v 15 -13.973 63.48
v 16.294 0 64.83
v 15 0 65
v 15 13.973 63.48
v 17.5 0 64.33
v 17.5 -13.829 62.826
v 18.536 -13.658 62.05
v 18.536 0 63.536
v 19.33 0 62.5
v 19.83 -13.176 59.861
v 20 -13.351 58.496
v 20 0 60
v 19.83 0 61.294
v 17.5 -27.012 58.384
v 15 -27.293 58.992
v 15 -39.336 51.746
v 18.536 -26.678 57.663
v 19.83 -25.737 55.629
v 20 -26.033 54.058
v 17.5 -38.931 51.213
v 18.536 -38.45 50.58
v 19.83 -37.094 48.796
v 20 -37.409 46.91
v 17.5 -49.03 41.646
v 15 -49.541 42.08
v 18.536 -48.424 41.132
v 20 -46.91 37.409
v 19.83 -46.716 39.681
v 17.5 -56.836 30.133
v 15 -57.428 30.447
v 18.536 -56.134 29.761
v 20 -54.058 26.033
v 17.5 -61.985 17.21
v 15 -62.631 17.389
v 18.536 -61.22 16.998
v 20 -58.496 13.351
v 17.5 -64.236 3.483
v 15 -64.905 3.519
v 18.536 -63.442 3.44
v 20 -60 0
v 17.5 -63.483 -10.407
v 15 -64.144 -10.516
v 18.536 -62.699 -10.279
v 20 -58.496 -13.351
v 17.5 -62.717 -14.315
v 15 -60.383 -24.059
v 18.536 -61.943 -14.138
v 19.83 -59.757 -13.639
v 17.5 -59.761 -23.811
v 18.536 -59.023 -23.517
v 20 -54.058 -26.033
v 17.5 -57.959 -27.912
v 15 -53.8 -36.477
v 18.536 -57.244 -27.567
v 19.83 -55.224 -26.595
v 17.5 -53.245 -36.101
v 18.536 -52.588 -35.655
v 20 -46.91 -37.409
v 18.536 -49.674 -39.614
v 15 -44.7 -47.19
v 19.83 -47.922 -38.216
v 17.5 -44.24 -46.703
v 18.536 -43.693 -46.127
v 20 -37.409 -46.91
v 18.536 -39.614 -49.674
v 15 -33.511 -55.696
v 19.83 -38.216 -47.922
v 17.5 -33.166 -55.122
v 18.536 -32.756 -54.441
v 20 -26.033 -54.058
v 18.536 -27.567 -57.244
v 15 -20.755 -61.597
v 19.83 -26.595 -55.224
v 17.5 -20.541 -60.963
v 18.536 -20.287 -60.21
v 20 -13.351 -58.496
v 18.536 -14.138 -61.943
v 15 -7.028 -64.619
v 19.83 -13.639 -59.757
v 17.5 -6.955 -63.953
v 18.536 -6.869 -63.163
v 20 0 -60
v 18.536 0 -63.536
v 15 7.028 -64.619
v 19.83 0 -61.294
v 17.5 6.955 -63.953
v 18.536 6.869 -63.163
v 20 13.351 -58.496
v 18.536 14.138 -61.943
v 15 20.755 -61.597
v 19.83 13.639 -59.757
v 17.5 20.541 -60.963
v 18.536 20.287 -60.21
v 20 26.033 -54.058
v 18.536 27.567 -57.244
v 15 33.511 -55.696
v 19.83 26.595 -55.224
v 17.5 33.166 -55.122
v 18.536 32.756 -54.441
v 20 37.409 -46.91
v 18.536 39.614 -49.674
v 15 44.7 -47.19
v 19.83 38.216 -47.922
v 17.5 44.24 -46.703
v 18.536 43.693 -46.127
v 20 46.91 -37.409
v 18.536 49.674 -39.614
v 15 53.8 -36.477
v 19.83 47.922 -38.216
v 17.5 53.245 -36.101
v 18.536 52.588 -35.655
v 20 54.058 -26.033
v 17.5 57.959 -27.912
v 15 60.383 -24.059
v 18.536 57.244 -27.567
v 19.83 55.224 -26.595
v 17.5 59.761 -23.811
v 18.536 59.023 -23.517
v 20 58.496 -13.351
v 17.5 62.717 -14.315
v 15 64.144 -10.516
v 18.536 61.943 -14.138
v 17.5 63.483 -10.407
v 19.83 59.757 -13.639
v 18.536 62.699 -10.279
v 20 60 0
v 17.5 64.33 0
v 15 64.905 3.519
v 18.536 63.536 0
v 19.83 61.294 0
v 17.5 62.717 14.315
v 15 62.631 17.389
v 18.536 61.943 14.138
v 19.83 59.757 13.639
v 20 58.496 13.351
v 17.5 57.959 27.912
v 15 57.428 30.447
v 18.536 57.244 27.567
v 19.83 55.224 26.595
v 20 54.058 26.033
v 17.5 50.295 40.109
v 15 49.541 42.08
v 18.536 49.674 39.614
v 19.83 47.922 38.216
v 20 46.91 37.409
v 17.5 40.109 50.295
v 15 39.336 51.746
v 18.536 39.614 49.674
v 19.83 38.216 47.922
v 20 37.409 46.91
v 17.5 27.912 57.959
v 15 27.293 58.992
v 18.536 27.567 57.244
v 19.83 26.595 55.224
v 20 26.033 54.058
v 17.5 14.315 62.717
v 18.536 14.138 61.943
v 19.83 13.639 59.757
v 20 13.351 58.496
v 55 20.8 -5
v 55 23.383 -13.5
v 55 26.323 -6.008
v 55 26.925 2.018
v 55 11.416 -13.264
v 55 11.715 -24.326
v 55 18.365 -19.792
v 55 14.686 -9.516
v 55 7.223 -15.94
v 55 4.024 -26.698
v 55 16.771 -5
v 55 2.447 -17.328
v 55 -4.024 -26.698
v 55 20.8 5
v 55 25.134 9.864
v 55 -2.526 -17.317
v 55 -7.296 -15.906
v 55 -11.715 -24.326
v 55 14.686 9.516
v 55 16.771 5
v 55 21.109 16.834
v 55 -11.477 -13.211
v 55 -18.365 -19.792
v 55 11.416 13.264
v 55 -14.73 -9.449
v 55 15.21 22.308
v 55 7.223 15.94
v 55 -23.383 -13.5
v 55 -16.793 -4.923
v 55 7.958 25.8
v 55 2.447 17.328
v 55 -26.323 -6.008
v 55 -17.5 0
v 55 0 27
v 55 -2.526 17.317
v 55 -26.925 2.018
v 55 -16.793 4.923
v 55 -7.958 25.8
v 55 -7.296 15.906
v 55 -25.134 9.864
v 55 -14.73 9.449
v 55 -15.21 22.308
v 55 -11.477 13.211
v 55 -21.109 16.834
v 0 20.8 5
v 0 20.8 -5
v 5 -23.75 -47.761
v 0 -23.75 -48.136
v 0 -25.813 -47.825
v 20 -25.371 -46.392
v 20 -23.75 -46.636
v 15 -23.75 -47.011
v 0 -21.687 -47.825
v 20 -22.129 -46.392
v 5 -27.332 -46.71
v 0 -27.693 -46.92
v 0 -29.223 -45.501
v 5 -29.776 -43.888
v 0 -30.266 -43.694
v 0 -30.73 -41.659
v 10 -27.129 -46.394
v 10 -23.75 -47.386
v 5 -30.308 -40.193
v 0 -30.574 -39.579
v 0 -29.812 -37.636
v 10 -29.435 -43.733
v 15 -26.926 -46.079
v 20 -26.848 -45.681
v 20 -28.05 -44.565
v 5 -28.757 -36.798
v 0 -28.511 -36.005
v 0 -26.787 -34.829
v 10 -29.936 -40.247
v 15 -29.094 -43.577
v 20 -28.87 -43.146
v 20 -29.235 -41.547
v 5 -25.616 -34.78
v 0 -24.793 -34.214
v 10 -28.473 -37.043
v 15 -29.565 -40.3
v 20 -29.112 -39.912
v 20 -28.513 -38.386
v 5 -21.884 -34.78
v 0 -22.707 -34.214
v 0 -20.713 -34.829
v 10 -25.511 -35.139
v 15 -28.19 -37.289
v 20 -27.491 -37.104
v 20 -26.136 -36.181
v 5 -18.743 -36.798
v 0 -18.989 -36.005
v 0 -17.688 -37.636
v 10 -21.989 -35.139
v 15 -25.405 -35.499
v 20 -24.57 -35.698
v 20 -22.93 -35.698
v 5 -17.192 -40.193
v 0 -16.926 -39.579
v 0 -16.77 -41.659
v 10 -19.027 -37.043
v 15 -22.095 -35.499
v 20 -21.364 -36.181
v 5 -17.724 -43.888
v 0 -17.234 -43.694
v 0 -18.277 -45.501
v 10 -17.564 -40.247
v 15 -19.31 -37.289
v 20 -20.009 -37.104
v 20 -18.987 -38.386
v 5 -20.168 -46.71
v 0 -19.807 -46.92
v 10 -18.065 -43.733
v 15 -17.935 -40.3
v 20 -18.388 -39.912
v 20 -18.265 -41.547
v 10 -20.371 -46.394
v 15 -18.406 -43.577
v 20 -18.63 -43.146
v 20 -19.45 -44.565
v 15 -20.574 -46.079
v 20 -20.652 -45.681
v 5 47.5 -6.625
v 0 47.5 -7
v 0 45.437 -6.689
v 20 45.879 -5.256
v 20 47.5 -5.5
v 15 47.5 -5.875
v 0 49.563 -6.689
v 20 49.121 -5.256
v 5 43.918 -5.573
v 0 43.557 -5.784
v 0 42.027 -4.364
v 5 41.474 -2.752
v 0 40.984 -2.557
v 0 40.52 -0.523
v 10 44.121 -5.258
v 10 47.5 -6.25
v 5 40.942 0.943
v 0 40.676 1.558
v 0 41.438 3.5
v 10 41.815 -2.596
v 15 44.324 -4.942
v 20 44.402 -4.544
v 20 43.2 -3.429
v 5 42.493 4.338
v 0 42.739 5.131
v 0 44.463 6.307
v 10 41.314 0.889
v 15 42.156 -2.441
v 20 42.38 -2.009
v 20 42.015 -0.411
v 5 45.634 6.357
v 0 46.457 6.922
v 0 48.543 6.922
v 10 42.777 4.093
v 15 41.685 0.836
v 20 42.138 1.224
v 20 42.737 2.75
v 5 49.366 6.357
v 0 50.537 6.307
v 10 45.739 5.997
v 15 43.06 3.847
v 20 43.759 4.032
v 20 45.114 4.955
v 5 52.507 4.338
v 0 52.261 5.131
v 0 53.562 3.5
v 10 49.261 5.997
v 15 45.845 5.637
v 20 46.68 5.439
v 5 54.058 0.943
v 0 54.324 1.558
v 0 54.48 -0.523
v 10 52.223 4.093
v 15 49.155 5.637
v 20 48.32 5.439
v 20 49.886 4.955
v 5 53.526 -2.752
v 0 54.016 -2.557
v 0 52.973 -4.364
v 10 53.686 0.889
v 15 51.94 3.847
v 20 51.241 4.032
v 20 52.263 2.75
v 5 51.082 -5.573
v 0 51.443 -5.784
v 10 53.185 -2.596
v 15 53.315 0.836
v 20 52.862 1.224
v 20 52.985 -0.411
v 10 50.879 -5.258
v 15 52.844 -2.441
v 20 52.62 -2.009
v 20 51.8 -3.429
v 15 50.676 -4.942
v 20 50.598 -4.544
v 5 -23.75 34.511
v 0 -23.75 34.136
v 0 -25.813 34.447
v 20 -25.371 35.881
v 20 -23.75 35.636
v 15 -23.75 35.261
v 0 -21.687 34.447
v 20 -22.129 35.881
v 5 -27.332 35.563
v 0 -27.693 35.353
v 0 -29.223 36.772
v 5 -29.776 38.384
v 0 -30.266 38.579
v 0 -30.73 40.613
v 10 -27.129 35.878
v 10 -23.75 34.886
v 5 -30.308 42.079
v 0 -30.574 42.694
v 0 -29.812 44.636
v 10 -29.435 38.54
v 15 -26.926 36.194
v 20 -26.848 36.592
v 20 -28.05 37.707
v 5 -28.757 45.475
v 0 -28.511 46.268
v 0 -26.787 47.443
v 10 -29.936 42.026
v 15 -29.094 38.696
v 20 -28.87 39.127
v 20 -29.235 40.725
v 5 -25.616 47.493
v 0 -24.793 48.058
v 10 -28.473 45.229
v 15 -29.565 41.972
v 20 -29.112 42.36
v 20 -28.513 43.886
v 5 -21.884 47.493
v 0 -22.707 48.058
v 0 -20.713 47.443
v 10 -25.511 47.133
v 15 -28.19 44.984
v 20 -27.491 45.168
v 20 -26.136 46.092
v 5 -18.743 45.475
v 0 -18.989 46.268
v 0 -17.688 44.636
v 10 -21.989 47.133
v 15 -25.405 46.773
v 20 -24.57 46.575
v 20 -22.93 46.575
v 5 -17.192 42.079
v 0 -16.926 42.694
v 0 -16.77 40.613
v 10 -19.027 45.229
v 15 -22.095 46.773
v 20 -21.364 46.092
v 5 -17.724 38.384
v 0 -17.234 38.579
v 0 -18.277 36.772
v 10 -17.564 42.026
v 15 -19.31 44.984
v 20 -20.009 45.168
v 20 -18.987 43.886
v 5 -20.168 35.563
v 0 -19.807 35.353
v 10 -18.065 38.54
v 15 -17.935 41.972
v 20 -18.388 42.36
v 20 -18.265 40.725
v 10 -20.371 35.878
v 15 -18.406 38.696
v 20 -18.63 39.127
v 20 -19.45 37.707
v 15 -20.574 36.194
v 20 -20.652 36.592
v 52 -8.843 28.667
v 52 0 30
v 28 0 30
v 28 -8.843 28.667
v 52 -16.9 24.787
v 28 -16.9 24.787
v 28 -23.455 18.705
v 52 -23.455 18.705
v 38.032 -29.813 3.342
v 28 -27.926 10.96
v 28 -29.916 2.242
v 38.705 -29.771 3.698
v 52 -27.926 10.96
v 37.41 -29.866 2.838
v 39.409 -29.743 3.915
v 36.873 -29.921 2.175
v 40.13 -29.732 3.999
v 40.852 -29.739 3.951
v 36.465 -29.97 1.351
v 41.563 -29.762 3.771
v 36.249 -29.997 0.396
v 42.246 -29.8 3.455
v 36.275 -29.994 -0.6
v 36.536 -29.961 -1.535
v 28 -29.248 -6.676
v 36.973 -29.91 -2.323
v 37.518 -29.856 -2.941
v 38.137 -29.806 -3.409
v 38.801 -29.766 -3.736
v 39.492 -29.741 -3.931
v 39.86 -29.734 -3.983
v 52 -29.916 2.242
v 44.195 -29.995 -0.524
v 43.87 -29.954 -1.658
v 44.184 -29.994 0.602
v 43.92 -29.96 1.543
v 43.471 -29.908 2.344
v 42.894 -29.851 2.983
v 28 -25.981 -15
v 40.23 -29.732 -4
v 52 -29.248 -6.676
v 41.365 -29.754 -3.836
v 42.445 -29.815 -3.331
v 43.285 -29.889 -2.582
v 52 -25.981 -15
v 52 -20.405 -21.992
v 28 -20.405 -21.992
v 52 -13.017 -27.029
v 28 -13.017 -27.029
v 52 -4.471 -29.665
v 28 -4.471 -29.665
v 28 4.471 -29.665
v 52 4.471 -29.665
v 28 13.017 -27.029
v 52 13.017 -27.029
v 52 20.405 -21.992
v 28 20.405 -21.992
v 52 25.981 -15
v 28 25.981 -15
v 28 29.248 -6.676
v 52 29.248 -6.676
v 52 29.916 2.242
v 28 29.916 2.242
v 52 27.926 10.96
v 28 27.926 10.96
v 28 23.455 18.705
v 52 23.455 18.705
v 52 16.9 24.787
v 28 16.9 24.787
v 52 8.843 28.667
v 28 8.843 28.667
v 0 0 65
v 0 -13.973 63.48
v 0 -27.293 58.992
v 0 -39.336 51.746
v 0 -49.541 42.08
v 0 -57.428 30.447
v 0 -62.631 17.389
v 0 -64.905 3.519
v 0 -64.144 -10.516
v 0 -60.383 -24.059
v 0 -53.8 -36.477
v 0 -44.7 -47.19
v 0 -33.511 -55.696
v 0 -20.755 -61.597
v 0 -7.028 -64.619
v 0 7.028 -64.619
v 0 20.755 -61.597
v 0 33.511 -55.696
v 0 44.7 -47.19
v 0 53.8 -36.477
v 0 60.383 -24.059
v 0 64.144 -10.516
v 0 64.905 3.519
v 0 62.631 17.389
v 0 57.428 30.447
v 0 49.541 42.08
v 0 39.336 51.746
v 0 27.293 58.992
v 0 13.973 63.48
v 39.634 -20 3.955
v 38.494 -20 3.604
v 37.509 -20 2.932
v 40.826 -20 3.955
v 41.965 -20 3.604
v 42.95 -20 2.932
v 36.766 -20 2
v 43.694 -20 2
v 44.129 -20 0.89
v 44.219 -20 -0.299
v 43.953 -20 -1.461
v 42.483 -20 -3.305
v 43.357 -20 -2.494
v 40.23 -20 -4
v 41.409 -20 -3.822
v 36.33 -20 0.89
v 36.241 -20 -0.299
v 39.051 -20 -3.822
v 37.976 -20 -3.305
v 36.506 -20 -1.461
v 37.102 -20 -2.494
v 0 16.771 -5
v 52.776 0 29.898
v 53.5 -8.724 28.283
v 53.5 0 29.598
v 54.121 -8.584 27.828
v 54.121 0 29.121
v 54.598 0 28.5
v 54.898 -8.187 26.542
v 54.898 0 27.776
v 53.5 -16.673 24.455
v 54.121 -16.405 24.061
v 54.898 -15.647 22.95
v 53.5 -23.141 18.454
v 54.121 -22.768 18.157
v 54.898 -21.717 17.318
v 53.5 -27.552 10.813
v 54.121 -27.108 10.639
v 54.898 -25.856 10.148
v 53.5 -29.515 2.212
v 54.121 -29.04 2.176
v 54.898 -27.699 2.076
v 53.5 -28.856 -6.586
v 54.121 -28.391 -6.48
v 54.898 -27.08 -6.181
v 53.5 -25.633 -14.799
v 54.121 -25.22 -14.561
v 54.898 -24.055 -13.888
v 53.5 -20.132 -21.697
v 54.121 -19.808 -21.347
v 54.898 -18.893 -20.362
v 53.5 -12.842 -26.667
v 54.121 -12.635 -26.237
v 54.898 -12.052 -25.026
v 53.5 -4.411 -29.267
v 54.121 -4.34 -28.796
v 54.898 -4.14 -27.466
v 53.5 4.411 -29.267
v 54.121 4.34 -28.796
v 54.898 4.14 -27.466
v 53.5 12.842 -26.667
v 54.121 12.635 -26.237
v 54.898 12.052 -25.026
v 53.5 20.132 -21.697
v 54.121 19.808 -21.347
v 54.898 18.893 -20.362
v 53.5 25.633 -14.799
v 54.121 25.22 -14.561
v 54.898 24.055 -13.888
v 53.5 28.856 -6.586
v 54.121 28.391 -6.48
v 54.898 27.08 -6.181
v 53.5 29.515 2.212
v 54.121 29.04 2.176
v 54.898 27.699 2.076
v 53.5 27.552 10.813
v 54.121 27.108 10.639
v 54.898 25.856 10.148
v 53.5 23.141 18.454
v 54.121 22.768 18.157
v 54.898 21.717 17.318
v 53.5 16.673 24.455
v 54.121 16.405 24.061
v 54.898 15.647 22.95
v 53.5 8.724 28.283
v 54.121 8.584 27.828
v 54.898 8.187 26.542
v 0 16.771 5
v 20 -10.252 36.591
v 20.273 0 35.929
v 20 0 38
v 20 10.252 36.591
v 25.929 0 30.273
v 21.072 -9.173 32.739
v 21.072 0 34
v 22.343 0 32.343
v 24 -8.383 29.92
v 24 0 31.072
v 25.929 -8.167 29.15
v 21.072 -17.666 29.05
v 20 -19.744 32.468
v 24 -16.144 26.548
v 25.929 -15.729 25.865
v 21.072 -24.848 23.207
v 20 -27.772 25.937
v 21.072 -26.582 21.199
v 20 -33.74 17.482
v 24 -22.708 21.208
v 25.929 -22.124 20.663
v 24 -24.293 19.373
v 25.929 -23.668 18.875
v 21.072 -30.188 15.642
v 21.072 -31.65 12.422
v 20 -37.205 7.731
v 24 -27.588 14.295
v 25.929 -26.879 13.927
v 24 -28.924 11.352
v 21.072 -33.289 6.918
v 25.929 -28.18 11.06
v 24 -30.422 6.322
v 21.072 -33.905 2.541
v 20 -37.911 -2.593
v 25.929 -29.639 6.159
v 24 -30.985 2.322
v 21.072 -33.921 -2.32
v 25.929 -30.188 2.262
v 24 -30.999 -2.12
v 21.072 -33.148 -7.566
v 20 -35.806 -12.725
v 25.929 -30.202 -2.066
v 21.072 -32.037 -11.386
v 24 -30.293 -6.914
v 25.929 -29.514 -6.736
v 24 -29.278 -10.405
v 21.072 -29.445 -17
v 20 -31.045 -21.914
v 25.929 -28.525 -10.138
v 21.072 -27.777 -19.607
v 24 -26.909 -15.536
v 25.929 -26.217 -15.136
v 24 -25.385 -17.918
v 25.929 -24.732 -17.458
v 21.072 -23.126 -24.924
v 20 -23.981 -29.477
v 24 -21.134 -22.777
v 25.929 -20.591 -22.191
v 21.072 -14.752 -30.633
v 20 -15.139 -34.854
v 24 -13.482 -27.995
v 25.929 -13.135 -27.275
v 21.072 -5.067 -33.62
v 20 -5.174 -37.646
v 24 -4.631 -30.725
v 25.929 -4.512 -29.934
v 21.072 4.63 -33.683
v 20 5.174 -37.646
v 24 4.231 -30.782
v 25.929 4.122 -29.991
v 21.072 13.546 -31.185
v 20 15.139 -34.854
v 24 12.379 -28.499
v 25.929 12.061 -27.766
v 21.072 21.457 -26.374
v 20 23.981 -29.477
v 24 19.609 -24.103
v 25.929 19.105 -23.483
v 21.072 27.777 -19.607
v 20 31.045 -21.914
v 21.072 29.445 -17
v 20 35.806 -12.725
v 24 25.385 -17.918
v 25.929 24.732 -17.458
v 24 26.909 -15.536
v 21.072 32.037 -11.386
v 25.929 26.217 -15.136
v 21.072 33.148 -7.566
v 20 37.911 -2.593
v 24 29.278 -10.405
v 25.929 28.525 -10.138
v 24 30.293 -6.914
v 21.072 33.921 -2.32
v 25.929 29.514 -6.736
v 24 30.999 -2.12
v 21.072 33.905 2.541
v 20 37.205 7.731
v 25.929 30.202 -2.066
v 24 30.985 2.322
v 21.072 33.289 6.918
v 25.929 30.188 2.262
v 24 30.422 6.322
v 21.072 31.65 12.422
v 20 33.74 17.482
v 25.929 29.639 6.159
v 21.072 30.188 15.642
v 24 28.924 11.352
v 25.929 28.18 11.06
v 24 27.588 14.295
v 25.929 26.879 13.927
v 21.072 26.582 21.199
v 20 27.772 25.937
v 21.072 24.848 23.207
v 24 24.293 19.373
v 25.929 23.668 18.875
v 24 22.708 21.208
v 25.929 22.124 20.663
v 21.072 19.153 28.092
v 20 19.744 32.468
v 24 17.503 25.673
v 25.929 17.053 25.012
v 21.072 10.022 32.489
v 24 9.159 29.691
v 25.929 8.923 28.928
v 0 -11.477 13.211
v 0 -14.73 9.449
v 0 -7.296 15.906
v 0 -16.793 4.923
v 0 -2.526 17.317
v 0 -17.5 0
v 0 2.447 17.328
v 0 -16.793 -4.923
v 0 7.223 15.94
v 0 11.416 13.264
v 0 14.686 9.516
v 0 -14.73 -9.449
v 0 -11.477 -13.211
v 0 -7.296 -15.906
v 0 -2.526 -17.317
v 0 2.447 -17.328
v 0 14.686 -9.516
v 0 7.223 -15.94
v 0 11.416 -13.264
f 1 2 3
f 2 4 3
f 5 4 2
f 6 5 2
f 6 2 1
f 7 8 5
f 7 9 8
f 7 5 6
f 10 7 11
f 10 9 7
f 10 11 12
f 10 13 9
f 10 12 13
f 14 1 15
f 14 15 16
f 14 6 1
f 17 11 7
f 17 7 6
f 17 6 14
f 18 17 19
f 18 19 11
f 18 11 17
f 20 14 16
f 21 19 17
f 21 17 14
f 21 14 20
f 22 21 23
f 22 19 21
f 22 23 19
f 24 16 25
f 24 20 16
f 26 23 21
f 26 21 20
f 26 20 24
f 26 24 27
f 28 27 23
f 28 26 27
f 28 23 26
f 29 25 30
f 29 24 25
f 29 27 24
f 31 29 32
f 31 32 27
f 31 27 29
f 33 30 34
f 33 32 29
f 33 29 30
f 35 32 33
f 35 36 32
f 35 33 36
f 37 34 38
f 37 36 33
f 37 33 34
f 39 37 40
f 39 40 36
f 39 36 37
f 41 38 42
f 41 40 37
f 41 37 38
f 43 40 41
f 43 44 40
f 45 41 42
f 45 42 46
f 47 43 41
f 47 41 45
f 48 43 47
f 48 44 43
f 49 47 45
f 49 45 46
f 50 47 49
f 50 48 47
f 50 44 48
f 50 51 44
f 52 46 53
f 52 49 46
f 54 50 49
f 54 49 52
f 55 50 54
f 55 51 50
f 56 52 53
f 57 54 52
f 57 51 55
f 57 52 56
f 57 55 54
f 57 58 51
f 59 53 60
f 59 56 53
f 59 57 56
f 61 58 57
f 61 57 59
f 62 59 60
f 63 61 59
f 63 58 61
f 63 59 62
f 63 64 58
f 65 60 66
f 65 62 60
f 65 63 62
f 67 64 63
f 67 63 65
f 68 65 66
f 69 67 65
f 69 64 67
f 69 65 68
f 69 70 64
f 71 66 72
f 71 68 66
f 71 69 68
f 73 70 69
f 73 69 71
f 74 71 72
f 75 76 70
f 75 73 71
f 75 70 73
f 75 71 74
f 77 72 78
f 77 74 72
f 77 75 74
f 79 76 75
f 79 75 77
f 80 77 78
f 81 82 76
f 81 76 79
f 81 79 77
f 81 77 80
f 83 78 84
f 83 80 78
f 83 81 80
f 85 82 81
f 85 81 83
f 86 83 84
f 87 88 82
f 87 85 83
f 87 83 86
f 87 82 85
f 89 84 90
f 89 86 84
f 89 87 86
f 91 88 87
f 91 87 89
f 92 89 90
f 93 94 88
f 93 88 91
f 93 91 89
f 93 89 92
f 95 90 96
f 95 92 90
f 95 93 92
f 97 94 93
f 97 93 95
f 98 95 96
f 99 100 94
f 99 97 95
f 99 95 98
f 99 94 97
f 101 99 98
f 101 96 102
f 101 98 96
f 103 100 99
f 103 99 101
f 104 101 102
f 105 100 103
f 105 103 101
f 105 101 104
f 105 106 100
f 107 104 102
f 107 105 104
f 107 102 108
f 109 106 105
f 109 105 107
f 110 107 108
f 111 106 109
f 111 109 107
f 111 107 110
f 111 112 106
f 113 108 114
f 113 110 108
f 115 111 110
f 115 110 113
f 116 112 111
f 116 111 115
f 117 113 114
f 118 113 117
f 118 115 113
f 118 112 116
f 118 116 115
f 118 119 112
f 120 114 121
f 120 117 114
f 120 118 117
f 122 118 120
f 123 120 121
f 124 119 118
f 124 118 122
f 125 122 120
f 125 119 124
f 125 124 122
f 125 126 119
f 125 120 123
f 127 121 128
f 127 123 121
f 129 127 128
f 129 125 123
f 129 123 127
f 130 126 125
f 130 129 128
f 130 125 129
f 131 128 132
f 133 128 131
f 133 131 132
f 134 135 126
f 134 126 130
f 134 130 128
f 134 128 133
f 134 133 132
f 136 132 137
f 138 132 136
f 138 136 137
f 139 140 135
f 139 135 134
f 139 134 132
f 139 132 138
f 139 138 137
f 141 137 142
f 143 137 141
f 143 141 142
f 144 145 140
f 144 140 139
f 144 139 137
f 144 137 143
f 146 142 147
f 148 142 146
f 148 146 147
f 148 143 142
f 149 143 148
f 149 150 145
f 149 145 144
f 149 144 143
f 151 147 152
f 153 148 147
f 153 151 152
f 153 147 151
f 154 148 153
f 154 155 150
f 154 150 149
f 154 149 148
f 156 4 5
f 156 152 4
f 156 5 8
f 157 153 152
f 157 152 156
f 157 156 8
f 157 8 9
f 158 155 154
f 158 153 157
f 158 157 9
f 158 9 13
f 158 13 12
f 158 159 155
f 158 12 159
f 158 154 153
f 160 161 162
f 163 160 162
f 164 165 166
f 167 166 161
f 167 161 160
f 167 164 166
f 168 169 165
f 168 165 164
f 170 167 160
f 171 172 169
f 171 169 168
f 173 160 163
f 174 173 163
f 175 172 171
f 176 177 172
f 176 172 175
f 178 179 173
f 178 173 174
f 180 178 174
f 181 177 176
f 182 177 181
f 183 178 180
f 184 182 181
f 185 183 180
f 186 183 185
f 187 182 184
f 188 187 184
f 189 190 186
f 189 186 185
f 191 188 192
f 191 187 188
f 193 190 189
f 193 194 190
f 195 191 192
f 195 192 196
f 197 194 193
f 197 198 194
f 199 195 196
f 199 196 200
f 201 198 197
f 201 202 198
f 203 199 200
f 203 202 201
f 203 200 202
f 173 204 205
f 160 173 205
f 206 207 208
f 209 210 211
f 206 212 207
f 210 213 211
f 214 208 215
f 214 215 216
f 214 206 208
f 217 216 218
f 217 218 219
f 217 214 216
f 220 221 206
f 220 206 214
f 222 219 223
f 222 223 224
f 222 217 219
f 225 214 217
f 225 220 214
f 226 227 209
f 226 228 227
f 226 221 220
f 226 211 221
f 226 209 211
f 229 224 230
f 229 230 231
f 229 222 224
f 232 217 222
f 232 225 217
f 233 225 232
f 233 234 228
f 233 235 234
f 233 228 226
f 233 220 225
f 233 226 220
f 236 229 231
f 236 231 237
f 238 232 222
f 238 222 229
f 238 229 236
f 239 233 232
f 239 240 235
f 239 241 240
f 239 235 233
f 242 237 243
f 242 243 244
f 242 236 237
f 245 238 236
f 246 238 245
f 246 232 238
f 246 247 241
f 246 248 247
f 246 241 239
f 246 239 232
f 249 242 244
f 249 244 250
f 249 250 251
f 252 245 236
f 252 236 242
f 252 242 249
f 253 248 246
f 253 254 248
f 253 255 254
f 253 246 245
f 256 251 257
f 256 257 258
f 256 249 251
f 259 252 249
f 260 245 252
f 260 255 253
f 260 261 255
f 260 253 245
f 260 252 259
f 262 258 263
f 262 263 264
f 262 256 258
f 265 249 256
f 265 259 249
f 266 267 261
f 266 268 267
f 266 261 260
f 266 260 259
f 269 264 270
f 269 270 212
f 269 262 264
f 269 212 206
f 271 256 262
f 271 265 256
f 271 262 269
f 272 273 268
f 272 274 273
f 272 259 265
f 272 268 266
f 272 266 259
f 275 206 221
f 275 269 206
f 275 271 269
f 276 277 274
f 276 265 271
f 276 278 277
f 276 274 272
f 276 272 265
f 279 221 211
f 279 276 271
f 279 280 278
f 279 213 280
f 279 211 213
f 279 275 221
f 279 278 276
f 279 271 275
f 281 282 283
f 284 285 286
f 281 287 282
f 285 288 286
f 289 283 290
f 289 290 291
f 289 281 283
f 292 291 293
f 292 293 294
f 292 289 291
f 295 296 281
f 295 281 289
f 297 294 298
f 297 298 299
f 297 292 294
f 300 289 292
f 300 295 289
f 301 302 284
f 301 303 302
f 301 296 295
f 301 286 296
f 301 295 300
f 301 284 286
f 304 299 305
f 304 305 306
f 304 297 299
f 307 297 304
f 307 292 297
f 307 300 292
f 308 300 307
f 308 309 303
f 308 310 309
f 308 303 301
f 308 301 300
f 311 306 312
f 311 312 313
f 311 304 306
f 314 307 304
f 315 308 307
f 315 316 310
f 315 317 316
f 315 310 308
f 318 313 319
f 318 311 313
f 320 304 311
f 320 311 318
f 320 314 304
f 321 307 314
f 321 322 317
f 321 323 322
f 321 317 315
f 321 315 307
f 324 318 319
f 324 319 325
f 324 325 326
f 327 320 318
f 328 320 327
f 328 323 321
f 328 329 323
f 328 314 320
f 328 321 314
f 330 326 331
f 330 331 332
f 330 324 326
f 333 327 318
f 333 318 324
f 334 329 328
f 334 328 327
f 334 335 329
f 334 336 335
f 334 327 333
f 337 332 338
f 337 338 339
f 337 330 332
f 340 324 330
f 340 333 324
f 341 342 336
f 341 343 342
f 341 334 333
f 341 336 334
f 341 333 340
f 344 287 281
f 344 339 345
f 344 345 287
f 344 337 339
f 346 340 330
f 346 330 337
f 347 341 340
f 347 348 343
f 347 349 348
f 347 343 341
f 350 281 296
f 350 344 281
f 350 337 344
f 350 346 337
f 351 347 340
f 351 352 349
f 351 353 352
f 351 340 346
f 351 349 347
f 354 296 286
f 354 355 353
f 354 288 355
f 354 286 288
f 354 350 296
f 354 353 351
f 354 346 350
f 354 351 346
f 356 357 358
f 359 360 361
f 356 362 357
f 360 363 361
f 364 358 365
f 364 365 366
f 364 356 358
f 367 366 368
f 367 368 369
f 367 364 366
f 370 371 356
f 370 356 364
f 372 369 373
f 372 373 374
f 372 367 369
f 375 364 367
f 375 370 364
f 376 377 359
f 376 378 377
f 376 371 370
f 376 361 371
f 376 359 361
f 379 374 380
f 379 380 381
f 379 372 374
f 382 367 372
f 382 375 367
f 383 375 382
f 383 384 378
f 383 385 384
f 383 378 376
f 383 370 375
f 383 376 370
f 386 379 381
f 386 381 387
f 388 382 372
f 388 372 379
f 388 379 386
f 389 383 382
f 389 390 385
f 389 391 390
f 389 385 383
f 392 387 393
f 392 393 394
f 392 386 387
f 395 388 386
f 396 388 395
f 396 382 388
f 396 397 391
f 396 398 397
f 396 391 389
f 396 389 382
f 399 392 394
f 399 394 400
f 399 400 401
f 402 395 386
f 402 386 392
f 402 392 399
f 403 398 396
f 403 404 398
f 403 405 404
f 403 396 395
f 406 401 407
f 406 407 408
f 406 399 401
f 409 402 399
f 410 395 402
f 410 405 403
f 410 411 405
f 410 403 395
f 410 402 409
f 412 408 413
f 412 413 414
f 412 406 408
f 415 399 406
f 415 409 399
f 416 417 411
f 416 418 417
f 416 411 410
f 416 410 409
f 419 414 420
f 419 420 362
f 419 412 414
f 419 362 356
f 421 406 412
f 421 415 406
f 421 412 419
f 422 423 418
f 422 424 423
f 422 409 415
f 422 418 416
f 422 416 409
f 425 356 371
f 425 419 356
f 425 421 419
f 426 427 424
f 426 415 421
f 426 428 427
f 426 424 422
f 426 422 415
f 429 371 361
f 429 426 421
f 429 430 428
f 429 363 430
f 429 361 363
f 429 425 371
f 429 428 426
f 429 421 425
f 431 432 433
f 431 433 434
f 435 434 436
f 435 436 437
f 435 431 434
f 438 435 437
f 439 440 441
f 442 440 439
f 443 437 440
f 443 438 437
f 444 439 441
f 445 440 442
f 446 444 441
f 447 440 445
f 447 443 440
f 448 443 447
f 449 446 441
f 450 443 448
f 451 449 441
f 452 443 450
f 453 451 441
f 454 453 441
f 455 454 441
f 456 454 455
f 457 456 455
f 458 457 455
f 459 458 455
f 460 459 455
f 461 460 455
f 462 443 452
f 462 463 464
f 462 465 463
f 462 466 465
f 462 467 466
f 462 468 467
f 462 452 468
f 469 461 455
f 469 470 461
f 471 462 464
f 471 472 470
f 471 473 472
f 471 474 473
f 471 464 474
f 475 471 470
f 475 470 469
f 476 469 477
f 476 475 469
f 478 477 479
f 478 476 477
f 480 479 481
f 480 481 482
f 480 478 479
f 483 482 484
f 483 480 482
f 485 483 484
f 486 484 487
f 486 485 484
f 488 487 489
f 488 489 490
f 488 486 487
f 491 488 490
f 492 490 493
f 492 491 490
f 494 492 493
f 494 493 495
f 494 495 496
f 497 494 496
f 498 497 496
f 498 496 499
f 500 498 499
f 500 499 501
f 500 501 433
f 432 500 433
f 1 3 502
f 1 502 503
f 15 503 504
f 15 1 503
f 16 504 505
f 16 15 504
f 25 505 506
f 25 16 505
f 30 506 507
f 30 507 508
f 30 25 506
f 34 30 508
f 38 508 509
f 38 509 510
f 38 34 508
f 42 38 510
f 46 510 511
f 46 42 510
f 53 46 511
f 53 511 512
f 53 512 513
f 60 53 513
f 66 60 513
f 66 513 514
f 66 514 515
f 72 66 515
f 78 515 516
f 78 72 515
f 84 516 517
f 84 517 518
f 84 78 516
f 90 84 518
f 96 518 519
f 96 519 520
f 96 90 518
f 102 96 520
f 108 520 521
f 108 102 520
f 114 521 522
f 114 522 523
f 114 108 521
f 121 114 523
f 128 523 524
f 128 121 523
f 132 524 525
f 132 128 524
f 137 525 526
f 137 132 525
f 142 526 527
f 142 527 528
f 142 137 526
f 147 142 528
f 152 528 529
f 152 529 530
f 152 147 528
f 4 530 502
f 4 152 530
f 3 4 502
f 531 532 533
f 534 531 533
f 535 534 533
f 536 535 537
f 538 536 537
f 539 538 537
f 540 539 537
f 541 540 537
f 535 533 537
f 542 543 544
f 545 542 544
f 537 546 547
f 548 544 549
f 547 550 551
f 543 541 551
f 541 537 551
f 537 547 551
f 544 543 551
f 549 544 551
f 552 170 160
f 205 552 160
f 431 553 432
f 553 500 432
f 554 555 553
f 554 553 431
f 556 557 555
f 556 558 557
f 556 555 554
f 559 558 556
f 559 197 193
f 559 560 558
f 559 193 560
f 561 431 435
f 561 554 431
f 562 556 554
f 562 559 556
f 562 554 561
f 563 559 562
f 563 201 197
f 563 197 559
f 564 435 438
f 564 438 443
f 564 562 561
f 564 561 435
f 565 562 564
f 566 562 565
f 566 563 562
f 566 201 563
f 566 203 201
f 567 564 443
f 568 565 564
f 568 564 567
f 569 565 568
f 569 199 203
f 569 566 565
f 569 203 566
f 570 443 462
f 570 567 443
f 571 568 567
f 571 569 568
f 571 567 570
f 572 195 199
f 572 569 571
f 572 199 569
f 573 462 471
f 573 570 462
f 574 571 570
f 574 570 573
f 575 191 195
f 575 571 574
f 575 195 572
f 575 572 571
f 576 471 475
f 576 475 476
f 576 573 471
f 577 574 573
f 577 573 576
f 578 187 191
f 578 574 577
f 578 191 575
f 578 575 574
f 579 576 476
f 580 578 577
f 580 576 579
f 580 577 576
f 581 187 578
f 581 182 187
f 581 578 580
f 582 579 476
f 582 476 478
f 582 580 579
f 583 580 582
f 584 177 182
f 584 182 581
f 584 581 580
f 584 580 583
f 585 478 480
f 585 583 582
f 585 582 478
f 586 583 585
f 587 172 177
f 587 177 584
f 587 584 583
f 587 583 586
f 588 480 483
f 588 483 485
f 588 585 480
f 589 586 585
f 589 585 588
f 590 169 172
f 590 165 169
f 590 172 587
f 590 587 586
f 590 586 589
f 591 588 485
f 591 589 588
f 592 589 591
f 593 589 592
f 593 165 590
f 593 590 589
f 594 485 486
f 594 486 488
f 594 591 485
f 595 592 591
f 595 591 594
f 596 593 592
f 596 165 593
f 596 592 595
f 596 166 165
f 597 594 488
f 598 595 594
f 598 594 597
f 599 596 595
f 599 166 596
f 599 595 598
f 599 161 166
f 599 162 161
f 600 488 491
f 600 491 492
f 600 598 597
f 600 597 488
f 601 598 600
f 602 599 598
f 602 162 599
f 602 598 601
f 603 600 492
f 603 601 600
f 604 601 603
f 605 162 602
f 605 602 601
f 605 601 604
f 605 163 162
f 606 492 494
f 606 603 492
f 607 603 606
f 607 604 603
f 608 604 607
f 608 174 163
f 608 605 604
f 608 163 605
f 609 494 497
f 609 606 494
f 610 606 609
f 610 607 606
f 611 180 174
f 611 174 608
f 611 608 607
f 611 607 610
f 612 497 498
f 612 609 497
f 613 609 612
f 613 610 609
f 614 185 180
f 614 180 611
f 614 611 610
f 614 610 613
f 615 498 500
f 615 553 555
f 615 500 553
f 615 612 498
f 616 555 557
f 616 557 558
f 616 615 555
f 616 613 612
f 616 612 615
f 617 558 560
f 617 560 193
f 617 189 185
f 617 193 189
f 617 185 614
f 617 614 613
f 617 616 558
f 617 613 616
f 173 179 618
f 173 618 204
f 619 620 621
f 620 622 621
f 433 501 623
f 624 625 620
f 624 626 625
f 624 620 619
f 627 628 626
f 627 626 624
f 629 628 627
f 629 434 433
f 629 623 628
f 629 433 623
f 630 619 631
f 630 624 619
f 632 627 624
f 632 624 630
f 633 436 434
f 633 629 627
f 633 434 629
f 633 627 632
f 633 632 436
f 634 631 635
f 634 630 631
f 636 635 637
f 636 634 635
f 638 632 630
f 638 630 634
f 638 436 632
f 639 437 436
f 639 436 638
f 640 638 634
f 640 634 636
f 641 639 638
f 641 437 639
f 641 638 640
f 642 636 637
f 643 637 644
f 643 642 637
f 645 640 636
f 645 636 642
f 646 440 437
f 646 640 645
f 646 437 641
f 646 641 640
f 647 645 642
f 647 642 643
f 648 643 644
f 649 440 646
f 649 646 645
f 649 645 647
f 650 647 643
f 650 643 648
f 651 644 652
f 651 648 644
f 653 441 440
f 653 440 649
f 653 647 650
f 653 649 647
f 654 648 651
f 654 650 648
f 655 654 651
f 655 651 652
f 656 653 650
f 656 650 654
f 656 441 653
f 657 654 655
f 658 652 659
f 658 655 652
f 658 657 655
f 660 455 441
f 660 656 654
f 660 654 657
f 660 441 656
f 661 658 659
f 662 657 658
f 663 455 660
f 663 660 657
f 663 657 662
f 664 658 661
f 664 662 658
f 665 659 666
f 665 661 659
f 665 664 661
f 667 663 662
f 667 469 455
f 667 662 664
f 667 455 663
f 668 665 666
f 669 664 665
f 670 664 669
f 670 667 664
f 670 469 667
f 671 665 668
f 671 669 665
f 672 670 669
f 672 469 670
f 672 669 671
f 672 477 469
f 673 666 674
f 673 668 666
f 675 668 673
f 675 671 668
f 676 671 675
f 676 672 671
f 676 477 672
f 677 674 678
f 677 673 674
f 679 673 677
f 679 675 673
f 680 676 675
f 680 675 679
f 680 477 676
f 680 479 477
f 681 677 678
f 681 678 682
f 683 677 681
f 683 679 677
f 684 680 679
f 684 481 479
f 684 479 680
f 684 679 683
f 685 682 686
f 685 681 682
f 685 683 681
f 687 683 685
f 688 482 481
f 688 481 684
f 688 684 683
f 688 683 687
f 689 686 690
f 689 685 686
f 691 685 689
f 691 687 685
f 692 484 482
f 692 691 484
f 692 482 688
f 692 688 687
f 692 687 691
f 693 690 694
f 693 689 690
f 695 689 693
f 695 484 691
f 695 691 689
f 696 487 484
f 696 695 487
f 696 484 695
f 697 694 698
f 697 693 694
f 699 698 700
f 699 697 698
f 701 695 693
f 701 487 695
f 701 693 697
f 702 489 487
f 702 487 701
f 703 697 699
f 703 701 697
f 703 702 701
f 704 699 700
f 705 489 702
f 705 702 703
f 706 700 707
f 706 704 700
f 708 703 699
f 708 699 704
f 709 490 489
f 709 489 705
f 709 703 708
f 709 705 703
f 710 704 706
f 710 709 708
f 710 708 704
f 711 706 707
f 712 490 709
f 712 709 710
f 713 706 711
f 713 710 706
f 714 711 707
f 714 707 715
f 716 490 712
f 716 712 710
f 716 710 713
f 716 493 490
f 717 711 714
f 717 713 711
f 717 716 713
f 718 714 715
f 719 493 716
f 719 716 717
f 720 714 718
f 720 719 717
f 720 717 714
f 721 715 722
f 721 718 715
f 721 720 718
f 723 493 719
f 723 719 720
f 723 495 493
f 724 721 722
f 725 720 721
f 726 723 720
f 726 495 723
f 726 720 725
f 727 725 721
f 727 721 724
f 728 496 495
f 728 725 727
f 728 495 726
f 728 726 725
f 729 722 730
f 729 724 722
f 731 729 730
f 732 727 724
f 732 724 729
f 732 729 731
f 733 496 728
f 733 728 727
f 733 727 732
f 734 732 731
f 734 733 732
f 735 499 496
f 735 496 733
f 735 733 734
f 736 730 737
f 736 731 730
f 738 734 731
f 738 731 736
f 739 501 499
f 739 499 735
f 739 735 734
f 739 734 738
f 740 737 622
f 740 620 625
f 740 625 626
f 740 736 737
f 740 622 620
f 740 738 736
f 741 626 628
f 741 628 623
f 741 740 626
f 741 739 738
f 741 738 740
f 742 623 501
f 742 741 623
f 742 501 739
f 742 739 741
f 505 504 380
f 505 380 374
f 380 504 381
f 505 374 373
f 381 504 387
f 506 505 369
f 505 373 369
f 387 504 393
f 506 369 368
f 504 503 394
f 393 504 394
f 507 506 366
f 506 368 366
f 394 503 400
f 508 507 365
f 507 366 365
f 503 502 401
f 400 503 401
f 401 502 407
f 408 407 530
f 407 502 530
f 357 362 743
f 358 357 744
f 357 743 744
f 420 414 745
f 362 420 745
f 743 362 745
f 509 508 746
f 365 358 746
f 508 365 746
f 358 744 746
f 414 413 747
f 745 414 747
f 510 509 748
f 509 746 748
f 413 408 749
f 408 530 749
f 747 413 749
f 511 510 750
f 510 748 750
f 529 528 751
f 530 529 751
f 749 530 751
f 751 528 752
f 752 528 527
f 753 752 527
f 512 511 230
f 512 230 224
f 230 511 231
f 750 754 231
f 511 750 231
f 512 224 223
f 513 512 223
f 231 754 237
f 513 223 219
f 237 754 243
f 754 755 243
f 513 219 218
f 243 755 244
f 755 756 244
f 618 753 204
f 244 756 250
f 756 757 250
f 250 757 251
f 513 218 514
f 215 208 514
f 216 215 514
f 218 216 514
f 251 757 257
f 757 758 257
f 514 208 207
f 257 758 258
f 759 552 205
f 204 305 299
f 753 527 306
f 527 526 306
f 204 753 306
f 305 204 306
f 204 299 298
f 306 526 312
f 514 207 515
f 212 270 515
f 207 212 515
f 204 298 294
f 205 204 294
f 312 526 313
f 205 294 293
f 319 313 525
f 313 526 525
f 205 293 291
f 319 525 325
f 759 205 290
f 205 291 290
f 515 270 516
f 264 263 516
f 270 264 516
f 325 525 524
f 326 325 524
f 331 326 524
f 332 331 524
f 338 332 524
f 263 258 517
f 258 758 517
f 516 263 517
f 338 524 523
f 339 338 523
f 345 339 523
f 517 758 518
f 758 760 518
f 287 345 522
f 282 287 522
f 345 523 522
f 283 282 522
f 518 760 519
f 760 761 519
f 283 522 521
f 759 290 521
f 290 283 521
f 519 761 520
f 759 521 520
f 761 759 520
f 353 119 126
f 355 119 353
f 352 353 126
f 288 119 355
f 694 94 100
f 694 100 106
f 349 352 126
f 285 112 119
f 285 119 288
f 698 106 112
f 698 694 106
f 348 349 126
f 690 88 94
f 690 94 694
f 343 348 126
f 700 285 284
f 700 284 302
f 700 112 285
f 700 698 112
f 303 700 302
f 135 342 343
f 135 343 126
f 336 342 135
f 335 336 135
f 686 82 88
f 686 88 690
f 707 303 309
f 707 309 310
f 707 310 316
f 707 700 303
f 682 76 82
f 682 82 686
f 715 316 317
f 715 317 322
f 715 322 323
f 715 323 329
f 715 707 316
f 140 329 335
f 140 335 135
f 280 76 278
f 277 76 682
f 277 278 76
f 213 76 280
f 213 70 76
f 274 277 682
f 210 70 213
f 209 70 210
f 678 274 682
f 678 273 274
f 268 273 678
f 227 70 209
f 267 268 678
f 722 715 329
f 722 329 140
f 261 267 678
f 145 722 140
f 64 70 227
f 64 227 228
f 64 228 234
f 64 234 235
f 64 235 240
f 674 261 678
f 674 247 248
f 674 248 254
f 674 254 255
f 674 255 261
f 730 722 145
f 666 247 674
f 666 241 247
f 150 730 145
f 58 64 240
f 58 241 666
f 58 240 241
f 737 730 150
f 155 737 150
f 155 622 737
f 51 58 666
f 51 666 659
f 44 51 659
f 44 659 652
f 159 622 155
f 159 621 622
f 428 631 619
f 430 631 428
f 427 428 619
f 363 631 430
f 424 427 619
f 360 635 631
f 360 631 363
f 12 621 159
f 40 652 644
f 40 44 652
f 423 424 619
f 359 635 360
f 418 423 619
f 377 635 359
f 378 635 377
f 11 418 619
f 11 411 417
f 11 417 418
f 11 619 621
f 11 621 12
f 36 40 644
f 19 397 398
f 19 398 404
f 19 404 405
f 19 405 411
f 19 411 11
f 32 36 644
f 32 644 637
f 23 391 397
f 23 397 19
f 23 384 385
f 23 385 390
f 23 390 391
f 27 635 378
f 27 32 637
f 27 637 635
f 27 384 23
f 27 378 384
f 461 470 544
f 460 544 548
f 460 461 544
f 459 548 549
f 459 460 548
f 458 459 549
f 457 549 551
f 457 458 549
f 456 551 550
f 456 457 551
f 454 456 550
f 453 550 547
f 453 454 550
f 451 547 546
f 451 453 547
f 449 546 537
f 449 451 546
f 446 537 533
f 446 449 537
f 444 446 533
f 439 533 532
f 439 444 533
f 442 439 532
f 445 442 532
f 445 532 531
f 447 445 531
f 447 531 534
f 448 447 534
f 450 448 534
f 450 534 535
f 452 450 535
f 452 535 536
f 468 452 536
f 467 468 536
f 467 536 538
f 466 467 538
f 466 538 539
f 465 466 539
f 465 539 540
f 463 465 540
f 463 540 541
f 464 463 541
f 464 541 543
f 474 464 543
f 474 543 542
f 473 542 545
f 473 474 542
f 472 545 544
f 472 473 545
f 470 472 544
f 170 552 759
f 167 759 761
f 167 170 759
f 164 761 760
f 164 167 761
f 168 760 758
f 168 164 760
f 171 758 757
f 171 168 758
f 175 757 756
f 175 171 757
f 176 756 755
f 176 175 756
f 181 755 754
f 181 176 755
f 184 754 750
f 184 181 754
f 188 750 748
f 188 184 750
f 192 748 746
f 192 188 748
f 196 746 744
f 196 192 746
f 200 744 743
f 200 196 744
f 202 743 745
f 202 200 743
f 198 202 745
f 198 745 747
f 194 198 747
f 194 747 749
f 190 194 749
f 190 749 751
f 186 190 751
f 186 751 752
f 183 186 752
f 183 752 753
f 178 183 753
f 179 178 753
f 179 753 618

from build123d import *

# Parameters (mm, degrees)
SKETCH2_R          = 17.5
CUT_EXTRUDE1_DEPTH = 108.121426428
SKETCH3_W          = 10
SKETCH3_H          = 6.6
CUT_EXTRUDE2_DEPTH = 108.121426428
SKETCH4_R          = 4
CUT_EXTRUDE3_DEPTH = 10
SKETCH6_R          = 81.550028755
CUT_EXTRUDE6_DEPTH = 60


with BuildPart() as part:
    # Sketch1 → Revolve1 (revolve)
    with BuildSketch(Plane.XY, mode=Mode.PRIVATE) as revolve1_sk:
        with BuildLine():
            Line((-55, 0), (0, 0))
            Line((0, 0), (0, 65))
            Line((0, 65), (-15, 65))
            ThreePointArc((-15, 65), (-18.535533906, 63.535533906), (-20, 60))
            Line((-20, 60), (-20, 38))
            ThreePointArc((-20, 38), (-22.343145751, 32.343145751), (-28, 30))
            Line((-28, 30), (-52, 30))
            ThreePointArc((-52, 30), (-54.121320344, 29.121320344), (-55, 27))
            Line((-55, 27), (-55, 0))
        make_face()
    revolve(revolve1_sk.sketch.rotate(Axis((-55, 0, 0), (1, 0, 0)), 90), axis=Axis((-55, 0, 0), (1, 0, 0)))

    # Sketch2 → Cut-Extrude1 (cut, through all)
    with BuildSketch(Plane.ZY.offset(55)):
        Circle(SKETCH2_R)
    extrude(amount=-CUT_EXTRUDE1_DEPTH, mode=Mode.SUBTRACT)

    # Sketch3 → Cut-Extrude2 (cut, through all)
    with BuildSketch(Plane(origin=(0, 0, 0), x_dir=(0, 0, -1), z_dir=(1, 0, 0))):
        with Locations((0, 17.5)):
            Rectangle(SKETCH3_W, SKETCH3_H)
    extrude(amount=-CUT_EXTRUDE2_DEPTH, mode=Mode.SUBTRACT)

    # Sketch4 → Cut-Extrude3 (cut)
    with BuildSketch(Plane(origin=(0, -30, 0), x_dir=(-1, 0, 0), z_dir=(0, -1, 0))):
        with Locations(Location((40.229772479, 0, 0), (0, 0, 90))):
            Circle(SKETCH4_R)
    extrude(amount=-CUT_EXTRUDE3_DEPTH, mode=Mode.SUBTRACT)

    # Cut-Extrude5 cone 1 section (through the dimple's axis) → Cut-Extrude5 (revolve, cut)
    with BuildSketch(Plane(origin=(0, 47.5, 0), x_dir=(0, 0, -1), z_dir=(0, 1, 0))):
        Polygon((0, 0), (7, 0), (0, 93.336682434), align=None)
    revolve(axis=Axis((0, 47.5, 0), (-1, 0, 0)), mode=Mode.SUBTRACT)

    # Cut-Extrude5 cone 2 section (through the dimple's axis) → Cut-Extrude5 cone 2 (revolve, cut)
    with BuildSketch(Plane(origin=(0, -23.75, -41.13620668), x_dir=(0, 0, -1), z_dir=(0, 1, 0))):
        Polygon((0, 0), (7, 0), (0, 93.336682434), align=None)
    revolve(axis=Axis((0, -23.75, -41.13620668), (-1, 0, 0)), mode=Mode.SUBTRACT)

    # Cut-Extrude5 cone 3 section (through the dimple's axis) → Cut-Extrude5 cone 3 (revolve, cut)
    with BuildSketch(Plane(origin=(0, -23.75, 41.13620668), x_dir=(0, 0, -1), z_dir=(0, 1, 0))):
        Polygon((0, 0), (7, 0), (0, 93.336682434), align=None)
    revolve(axis=Axis((0, -23.75, 41.13620668), (-1, 0, 0)), mode=Mode.SUBTRACT)

    # Mirror1: part across plane


with BuildPart() as part_1:
    add(part.part)
    add(part.part.mirror(Plane.ZY))

    # Sketch6 → Cut-Extrude6 (cut)
    with BuildSketch(Plane(origin=(0, 0, 0), x_dir=(0, 0, -1), z_dir=(1, 0, 0))):
        Circle(SKETCH6_R)
    extrude(amount=-CUT_EXTRUDE6_DEPTH, mode=Mode.SUBTRACT)


solid = part_1.part
